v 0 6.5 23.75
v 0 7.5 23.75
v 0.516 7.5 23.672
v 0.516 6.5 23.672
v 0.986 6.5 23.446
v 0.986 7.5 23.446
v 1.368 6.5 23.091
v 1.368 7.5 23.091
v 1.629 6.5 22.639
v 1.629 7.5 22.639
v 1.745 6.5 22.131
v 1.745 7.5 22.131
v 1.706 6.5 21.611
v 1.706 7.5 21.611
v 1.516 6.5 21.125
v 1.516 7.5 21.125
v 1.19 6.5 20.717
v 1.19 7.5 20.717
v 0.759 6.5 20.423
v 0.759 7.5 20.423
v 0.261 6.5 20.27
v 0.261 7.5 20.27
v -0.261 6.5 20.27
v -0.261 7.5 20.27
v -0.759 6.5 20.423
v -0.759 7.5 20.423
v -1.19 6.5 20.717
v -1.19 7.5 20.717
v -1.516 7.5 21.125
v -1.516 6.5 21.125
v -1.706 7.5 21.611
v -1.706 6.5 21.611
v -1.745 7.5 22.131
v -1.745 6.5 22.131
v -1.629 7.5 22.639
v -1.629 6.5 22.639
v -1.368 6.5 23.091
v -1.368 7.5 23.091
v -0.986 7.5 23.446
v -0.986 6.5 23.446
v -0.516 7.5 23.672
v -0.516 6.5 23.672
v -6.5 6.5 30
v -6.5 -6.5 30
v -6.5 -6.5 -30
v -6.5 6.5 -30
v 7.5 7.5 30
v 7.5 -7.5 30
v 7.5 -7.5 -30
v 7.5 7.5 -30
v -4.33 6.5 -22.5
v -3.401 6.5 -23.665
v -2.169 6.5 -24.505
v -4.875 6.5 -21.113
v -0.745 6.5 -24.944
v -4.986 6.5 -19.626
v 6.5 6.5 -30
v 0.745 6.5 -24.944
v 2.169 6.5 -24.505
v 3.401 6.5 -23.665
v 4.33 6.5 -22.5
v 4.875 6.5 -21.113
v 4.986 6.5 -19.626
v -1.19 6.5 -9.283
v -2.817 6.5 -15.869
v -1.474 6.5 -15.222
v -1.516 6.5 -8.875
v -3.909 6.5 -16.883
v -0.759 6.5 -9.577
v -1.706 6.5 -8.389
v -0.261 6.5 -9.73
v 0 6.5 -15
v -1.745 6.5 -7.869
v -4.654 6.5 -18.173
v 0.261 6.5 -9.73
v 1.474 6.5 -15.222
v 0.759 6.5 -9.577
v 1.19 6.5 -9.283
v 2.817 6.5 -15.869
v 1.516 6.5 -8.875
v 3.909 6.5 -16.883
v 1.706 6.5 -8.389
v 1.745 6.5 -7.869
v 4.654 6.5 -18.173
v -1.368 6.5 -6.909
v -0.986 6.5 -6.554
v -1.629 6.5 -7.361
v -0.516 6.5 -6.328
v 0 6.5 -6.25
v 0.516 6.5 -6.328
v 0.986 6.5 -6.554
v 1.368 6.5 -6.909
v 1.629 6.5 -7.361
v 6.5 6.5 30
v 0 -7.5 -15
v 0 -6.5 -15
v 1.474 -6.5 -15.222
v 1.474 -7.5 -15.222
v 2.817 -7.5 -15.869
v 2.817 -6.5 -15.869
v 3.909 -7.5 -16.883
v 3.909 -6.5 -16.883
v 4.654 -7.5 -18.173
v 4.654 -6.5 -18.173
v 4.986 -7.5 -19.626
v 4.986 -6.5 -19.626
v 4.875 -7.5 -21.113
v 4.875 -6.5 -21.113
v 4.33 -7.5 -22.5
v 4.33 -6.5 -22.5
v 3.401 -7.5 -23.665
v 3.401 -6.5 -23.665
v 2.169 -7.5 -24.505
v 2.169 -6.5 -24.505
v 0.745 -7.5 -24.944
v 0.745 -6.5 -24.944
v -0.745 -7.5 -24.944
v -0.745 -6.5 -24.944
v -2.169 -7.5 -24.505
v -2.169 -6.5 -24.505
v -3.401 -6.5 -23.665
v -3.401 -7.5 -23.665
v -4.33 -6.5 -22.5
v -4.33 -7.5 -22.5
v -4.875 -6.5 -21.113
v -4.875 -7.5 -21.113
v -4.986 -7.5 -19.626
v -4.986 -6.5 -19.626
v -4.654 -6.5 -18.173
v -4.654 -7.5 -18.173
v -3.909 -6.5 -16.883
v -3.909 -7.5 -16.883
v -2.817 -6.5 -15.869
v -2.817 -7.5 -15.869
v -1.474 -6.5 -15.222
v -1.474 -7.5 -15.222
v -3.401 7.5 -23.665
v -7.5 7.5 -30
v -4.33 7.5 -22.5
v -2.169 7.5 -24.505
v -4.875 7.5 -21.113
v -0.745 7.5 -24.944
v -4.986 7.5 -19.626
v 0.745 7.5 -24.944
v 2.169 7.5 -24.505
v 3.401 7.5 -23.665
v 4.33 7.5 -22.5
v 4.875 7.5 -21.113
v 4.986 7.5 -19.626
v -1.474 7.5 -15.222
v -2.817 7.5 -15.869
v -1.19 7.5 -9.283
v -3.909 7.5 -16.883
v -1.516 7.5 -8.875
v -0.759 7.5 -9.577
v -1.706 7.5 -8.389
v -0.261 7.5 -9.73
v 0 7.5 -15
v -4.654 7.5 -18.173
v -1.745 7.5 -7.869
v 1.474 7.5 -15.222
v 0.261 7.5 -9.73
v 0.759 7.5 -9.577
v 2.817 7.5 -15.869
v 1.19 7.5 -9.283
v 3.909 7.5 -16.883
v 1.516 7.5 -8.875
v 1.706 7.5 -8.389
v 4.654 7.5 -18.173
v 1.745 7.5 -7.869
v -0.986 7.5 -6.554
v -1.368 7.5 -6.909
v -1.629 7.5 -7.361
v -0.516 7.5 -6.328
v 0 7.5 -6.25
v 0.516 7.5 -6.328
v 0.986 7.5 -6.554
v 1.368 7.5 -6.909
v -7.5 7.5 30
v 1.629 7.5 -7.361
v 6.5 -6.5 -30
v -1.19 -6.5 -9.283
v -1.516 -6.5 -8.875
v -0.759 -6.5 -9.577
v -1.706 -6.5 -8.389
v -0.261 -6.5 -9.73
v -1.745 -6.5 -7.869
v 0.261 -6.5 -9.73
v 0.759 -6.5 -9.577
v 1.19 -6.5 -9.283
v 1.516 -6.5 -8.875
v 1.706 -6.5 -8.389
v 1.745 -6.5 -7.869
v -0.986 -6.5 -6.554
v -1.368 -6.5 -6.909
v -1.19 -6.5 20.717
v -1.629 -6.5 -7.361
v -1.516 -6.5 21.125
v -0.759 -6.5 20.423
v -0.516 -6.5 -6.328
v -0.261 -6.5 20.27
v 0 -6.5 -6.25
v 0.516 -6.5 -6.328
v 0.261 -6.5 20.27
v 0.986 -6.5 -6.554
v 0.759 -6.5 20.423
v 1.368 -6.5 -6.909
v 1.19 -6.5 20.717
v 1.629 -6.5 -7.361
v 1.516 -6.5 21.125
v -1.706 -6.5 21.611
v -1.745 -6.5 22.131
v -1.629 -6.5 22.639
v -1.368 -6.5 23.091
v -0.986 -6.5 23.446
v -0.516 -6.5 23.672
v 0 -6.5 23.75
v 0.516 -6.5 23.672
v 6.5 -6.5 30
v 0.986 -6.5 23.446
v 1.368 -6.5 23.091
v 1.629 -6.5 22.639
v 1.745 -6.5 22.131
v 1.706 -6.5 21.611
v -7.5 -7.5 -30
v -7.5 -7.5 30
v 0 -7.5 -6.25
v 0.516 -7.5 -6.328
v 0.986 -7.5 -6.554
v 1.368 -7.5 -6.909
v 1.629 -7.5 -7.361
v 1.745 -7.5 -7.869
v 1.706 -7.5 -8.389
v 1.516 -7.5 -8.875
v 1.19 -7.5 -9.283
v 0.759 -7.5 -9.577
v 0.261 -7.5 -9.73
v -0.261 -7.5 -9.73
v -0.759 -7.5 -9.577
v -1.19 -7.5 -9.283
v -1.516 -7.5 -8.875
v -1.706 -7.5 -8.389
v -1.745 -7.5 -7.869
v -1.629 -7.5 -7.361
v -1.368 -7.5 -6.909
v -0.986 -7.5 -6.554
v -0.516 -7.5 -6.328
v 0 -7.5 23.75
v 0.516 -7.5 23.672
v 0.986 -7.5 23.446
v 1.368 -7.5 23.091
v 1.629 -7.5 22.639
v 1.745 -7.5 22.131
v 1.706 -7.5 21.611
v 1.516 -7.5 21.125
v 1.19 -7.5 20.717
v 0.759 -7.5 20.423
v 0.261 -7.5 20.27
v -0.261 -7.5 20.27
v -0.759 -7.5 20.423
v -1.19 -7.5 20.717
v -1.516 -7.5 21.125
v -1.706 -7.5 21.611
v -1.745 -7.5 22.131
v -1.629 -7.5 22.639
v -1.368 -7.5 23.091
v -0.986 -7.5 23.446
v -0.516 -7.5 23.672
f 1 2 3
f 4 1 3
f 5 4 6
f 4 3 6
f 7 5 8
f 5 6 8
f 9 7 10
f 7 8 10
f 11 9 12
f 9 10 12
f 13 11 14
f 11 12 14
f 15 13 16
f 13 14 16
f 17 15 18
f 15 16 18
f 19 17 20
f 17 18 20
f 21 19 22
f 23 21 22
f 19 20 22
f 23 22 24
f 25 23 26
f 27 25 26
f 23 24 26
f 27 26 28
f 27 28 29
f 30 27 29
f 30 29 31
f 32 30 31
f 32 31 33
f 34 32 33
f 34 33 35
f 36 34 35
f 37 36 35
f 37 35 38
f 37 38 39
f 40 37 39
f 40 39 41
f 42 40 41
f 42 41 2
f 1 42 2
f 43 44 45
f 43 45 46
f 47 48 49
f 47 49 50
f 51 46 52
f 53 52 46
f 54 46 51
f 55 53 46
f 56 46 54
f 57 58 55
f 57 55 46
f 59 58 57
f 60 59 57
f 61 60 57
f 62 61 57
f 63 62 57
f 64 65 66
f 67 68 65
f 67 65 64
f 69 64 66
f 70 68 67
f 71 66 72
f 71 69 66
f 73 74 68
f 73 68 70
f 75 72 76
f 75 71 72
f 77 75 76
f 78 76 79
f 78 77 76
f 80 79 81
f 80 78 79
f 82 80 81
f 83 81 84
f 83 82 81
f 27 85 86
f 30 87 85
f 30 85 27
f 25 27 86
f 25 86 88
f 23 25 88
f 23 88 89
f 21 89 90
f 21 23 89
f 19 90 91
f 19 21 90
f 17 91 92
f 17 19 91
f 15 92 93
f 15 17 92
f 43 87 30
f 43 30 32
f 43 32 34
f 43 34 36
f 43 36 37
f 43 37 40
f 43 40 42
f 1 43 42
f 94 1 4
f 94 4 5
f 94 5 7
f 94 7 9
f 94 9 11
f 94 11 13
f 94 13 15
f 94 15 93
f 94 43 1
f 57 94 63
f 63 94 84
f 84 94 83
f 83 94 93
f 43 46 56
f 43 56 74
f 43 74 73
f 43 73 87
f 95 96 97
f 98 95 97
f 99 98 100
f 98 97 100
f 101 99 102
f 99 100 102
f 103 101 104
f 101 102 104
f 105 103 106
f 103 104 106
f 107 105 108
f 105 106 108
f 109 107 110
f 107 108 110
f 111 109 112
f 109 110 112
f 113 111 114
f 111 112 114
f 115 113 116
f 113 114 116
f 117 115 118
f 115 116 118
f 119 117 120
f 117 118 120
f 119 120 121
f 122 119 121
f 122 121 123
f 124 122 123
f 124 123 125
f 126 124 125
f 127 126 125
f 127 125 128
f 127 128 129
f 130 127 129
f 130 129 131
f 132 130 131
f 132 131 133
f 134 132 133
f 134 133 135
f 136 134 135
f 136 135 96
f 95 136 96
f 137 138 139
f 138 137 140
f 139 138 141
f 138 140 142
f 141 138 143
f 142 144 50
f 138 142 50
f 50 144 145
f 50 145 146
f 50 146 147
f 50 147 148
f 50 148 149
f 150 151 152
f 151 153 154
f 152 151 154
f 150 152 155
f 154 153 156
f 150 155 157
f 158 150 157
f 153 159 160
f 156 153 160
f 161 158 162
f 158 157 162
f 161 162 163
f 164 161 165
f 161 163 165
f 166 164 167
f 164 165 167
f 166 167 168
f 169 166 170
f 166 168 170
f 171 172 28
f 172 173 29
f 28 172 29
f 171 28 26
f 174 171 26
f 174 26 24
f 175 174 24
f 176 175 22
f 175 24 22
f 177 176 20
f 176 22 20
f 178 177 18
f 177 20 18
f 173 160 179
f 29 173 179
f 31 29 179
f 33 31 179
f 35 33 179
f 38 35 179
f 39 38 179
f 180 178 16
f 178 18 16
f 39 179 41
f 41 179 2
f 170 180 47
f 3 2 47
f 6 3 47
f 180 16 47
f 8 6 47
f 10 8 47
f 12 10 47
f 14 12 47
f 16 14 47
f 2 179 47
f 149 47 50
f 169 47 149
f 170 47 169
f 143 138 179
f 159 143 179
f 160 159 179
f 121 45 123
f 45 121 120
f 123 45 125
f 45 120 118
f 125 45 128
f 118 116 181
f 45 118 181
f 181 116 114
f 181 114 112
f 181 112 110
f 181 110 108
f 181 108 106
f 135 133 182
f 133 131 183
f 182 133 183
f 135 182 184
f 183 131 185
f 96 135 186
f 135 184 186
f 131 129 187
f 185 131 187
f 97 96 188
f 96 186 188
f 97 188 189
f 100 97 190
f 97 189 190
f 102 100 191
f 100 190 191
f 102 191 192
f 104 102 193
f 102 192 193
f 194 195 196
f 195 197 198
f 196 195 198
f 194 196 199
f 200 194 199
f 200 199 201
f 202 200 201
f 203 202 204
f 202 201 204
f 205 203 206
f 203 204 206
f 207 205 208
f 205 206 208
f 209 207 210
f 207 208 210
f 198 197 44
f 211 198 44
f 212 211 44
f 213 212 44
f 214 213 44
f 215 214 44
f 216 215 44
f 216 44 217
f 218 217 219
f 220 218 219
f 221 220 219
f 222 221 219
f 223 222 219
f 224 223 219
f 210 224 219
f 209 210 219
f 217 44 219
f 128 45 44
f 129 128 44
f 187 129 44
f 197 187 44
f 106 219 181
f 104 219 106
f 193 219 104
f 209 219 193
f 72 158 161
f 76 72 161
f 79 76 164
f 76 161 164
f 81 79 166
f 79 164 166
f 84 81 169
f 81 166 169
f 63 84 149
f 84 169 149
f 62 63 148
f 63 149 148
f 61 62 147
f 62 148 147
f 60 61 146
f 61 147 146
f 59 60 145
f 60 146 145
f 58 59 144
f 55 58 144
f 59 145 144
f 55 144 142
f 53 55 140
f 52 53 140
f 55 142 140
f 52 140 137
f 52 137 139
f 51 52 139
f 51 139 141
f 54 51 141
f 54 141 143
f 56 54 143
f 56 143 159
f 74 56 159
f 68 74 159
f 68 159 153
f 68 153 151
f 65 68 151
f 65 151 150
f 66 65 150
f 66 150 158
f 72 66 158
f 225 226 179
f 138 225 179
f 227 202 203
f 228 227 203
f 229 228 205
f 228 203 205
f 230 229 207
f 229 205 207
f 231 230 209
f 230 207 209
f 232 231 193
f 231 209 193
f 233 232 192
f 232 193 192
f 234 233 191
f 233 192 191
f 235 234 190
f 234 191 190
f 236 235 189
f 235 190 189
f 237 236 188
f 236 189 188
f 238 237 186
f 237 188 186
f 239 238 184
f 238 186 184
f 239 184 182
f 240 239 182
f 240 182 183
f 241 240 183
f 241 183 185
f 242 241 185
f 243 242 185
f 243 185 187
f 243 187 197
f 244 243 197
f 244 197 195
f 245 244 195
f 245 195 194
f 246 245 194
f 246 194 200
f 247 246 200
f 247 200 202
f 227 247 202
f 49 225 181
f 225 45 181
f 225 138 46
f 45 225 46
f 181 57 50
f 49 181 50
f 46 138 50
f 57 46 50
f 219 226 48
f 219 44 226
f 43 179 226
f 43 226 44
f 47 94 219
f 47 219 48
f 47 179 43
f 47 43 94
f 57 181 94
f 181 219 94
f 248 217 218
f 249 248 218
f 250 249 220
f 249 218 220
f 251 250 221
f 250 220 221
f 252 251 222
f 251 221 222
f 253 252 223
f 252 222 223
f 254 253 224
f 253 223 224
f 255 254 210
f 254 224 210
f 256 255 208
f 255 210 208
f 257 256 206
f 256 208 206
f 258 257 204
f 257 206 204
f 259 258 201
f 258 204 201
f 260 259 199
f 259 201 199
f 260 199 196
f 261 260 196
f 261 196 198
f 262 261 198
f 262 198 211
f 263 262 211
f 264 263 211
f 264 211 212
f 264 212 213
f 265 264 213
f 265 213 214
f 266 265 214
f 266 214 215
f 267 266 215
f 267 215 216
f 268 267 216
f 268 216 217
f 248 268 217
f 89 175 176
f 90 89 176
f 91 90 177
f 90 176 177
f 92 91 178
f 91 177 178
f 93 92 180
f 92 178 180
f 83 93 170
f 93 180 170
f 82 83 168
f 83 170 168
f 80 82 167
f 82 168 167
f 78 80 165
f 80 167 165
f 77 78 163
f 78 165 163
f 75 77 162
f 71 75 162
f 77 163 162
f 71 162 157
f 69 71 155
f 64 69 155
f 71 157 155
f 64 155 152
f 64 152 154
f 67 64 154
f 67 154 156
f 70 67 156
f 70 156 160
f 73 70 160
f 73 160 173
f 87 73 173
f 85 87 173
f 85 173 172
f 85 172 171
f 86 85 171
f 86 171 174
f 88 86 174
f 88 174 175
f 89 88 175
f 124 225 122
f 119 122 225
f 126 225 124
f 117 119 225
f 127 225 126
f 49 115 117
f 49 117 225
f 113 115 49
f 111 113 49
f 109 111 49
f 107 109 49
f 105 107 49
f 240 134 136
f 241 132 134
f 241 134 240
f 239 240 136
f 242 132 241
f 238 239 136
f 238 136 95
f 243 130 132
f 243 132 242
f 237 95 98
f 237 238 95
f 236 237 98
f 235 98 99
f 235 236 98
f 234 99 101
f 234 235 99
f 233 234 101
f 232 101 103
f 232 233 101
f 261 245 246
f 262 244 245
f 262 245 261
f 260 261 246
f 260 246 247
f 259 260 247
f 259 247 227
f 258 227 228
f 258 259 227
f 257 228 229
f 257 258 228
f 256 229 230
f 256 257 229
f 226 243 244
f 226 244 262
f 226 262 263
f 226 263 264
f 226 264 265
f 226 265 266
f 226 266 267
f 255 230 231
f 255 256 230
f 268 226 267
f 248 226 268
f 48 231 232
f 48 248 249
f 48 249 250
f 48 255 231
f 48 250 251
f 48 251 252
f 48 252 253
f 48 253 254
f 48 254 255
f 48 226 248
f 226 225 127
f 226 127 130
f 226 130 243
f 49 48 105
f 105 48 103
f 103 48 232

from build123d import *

# Parameters (mm, degrees)
SKIZZE1_W                       = 15
SKIZZE1_H                       = 15
SKIZZE1_W_2                     = 13
SKIZZE1_H_2                     = 13
LINEAR_AUSTRAGEN_D_NN1_DEPTH    = 30
SKIZZE2_R                       = 1.75
SKIZZE2_R_2                     = 5
SCHNITT_LINEAR_AUSTRAGEN1_DEPTH = 17


with BuildPart() as part:
    # Skizze1 → Linear-Austragen-Dünn1 (new, symmetric)
    with BuildSketch(Plane.XY):
        Rectangle(SKIZZE1_W, SKIZZE1_H)
        Rectangle(SKIZZE1_W_2, SKIZZE1_H_2, mode=Mode.SUBTRACT)
    extrude(amount=LINEAR_AUSTRAGEN_D_NN1_DEPTH, both=True)

    # Skizze2 → Schnitt-Linear austragen1 (cut)
    with BuildSketch(Plane(origin=(0, 7.5, 0), x_dir=(1, 0, 0), z_dir=(0, 1, 0))):
        with Locations(Location((0, -22, 0), (0, 0, 270))):
            Circle(SKIZZE2_R)
        with Locations(Location((0, 8, 0), (0, 0, 270))):
            Circle(SKIZZE2_R)
        with Locations(Location((0, 20, 0), (0, 0, 270))):
            Circle(SKIZZE2_R_2)
    extrude(amount=-SCHNITT_LINEAR_AUSTRAGEN1_DEPTH, mode=Mode.SUBTRACT)


solid = part.part
